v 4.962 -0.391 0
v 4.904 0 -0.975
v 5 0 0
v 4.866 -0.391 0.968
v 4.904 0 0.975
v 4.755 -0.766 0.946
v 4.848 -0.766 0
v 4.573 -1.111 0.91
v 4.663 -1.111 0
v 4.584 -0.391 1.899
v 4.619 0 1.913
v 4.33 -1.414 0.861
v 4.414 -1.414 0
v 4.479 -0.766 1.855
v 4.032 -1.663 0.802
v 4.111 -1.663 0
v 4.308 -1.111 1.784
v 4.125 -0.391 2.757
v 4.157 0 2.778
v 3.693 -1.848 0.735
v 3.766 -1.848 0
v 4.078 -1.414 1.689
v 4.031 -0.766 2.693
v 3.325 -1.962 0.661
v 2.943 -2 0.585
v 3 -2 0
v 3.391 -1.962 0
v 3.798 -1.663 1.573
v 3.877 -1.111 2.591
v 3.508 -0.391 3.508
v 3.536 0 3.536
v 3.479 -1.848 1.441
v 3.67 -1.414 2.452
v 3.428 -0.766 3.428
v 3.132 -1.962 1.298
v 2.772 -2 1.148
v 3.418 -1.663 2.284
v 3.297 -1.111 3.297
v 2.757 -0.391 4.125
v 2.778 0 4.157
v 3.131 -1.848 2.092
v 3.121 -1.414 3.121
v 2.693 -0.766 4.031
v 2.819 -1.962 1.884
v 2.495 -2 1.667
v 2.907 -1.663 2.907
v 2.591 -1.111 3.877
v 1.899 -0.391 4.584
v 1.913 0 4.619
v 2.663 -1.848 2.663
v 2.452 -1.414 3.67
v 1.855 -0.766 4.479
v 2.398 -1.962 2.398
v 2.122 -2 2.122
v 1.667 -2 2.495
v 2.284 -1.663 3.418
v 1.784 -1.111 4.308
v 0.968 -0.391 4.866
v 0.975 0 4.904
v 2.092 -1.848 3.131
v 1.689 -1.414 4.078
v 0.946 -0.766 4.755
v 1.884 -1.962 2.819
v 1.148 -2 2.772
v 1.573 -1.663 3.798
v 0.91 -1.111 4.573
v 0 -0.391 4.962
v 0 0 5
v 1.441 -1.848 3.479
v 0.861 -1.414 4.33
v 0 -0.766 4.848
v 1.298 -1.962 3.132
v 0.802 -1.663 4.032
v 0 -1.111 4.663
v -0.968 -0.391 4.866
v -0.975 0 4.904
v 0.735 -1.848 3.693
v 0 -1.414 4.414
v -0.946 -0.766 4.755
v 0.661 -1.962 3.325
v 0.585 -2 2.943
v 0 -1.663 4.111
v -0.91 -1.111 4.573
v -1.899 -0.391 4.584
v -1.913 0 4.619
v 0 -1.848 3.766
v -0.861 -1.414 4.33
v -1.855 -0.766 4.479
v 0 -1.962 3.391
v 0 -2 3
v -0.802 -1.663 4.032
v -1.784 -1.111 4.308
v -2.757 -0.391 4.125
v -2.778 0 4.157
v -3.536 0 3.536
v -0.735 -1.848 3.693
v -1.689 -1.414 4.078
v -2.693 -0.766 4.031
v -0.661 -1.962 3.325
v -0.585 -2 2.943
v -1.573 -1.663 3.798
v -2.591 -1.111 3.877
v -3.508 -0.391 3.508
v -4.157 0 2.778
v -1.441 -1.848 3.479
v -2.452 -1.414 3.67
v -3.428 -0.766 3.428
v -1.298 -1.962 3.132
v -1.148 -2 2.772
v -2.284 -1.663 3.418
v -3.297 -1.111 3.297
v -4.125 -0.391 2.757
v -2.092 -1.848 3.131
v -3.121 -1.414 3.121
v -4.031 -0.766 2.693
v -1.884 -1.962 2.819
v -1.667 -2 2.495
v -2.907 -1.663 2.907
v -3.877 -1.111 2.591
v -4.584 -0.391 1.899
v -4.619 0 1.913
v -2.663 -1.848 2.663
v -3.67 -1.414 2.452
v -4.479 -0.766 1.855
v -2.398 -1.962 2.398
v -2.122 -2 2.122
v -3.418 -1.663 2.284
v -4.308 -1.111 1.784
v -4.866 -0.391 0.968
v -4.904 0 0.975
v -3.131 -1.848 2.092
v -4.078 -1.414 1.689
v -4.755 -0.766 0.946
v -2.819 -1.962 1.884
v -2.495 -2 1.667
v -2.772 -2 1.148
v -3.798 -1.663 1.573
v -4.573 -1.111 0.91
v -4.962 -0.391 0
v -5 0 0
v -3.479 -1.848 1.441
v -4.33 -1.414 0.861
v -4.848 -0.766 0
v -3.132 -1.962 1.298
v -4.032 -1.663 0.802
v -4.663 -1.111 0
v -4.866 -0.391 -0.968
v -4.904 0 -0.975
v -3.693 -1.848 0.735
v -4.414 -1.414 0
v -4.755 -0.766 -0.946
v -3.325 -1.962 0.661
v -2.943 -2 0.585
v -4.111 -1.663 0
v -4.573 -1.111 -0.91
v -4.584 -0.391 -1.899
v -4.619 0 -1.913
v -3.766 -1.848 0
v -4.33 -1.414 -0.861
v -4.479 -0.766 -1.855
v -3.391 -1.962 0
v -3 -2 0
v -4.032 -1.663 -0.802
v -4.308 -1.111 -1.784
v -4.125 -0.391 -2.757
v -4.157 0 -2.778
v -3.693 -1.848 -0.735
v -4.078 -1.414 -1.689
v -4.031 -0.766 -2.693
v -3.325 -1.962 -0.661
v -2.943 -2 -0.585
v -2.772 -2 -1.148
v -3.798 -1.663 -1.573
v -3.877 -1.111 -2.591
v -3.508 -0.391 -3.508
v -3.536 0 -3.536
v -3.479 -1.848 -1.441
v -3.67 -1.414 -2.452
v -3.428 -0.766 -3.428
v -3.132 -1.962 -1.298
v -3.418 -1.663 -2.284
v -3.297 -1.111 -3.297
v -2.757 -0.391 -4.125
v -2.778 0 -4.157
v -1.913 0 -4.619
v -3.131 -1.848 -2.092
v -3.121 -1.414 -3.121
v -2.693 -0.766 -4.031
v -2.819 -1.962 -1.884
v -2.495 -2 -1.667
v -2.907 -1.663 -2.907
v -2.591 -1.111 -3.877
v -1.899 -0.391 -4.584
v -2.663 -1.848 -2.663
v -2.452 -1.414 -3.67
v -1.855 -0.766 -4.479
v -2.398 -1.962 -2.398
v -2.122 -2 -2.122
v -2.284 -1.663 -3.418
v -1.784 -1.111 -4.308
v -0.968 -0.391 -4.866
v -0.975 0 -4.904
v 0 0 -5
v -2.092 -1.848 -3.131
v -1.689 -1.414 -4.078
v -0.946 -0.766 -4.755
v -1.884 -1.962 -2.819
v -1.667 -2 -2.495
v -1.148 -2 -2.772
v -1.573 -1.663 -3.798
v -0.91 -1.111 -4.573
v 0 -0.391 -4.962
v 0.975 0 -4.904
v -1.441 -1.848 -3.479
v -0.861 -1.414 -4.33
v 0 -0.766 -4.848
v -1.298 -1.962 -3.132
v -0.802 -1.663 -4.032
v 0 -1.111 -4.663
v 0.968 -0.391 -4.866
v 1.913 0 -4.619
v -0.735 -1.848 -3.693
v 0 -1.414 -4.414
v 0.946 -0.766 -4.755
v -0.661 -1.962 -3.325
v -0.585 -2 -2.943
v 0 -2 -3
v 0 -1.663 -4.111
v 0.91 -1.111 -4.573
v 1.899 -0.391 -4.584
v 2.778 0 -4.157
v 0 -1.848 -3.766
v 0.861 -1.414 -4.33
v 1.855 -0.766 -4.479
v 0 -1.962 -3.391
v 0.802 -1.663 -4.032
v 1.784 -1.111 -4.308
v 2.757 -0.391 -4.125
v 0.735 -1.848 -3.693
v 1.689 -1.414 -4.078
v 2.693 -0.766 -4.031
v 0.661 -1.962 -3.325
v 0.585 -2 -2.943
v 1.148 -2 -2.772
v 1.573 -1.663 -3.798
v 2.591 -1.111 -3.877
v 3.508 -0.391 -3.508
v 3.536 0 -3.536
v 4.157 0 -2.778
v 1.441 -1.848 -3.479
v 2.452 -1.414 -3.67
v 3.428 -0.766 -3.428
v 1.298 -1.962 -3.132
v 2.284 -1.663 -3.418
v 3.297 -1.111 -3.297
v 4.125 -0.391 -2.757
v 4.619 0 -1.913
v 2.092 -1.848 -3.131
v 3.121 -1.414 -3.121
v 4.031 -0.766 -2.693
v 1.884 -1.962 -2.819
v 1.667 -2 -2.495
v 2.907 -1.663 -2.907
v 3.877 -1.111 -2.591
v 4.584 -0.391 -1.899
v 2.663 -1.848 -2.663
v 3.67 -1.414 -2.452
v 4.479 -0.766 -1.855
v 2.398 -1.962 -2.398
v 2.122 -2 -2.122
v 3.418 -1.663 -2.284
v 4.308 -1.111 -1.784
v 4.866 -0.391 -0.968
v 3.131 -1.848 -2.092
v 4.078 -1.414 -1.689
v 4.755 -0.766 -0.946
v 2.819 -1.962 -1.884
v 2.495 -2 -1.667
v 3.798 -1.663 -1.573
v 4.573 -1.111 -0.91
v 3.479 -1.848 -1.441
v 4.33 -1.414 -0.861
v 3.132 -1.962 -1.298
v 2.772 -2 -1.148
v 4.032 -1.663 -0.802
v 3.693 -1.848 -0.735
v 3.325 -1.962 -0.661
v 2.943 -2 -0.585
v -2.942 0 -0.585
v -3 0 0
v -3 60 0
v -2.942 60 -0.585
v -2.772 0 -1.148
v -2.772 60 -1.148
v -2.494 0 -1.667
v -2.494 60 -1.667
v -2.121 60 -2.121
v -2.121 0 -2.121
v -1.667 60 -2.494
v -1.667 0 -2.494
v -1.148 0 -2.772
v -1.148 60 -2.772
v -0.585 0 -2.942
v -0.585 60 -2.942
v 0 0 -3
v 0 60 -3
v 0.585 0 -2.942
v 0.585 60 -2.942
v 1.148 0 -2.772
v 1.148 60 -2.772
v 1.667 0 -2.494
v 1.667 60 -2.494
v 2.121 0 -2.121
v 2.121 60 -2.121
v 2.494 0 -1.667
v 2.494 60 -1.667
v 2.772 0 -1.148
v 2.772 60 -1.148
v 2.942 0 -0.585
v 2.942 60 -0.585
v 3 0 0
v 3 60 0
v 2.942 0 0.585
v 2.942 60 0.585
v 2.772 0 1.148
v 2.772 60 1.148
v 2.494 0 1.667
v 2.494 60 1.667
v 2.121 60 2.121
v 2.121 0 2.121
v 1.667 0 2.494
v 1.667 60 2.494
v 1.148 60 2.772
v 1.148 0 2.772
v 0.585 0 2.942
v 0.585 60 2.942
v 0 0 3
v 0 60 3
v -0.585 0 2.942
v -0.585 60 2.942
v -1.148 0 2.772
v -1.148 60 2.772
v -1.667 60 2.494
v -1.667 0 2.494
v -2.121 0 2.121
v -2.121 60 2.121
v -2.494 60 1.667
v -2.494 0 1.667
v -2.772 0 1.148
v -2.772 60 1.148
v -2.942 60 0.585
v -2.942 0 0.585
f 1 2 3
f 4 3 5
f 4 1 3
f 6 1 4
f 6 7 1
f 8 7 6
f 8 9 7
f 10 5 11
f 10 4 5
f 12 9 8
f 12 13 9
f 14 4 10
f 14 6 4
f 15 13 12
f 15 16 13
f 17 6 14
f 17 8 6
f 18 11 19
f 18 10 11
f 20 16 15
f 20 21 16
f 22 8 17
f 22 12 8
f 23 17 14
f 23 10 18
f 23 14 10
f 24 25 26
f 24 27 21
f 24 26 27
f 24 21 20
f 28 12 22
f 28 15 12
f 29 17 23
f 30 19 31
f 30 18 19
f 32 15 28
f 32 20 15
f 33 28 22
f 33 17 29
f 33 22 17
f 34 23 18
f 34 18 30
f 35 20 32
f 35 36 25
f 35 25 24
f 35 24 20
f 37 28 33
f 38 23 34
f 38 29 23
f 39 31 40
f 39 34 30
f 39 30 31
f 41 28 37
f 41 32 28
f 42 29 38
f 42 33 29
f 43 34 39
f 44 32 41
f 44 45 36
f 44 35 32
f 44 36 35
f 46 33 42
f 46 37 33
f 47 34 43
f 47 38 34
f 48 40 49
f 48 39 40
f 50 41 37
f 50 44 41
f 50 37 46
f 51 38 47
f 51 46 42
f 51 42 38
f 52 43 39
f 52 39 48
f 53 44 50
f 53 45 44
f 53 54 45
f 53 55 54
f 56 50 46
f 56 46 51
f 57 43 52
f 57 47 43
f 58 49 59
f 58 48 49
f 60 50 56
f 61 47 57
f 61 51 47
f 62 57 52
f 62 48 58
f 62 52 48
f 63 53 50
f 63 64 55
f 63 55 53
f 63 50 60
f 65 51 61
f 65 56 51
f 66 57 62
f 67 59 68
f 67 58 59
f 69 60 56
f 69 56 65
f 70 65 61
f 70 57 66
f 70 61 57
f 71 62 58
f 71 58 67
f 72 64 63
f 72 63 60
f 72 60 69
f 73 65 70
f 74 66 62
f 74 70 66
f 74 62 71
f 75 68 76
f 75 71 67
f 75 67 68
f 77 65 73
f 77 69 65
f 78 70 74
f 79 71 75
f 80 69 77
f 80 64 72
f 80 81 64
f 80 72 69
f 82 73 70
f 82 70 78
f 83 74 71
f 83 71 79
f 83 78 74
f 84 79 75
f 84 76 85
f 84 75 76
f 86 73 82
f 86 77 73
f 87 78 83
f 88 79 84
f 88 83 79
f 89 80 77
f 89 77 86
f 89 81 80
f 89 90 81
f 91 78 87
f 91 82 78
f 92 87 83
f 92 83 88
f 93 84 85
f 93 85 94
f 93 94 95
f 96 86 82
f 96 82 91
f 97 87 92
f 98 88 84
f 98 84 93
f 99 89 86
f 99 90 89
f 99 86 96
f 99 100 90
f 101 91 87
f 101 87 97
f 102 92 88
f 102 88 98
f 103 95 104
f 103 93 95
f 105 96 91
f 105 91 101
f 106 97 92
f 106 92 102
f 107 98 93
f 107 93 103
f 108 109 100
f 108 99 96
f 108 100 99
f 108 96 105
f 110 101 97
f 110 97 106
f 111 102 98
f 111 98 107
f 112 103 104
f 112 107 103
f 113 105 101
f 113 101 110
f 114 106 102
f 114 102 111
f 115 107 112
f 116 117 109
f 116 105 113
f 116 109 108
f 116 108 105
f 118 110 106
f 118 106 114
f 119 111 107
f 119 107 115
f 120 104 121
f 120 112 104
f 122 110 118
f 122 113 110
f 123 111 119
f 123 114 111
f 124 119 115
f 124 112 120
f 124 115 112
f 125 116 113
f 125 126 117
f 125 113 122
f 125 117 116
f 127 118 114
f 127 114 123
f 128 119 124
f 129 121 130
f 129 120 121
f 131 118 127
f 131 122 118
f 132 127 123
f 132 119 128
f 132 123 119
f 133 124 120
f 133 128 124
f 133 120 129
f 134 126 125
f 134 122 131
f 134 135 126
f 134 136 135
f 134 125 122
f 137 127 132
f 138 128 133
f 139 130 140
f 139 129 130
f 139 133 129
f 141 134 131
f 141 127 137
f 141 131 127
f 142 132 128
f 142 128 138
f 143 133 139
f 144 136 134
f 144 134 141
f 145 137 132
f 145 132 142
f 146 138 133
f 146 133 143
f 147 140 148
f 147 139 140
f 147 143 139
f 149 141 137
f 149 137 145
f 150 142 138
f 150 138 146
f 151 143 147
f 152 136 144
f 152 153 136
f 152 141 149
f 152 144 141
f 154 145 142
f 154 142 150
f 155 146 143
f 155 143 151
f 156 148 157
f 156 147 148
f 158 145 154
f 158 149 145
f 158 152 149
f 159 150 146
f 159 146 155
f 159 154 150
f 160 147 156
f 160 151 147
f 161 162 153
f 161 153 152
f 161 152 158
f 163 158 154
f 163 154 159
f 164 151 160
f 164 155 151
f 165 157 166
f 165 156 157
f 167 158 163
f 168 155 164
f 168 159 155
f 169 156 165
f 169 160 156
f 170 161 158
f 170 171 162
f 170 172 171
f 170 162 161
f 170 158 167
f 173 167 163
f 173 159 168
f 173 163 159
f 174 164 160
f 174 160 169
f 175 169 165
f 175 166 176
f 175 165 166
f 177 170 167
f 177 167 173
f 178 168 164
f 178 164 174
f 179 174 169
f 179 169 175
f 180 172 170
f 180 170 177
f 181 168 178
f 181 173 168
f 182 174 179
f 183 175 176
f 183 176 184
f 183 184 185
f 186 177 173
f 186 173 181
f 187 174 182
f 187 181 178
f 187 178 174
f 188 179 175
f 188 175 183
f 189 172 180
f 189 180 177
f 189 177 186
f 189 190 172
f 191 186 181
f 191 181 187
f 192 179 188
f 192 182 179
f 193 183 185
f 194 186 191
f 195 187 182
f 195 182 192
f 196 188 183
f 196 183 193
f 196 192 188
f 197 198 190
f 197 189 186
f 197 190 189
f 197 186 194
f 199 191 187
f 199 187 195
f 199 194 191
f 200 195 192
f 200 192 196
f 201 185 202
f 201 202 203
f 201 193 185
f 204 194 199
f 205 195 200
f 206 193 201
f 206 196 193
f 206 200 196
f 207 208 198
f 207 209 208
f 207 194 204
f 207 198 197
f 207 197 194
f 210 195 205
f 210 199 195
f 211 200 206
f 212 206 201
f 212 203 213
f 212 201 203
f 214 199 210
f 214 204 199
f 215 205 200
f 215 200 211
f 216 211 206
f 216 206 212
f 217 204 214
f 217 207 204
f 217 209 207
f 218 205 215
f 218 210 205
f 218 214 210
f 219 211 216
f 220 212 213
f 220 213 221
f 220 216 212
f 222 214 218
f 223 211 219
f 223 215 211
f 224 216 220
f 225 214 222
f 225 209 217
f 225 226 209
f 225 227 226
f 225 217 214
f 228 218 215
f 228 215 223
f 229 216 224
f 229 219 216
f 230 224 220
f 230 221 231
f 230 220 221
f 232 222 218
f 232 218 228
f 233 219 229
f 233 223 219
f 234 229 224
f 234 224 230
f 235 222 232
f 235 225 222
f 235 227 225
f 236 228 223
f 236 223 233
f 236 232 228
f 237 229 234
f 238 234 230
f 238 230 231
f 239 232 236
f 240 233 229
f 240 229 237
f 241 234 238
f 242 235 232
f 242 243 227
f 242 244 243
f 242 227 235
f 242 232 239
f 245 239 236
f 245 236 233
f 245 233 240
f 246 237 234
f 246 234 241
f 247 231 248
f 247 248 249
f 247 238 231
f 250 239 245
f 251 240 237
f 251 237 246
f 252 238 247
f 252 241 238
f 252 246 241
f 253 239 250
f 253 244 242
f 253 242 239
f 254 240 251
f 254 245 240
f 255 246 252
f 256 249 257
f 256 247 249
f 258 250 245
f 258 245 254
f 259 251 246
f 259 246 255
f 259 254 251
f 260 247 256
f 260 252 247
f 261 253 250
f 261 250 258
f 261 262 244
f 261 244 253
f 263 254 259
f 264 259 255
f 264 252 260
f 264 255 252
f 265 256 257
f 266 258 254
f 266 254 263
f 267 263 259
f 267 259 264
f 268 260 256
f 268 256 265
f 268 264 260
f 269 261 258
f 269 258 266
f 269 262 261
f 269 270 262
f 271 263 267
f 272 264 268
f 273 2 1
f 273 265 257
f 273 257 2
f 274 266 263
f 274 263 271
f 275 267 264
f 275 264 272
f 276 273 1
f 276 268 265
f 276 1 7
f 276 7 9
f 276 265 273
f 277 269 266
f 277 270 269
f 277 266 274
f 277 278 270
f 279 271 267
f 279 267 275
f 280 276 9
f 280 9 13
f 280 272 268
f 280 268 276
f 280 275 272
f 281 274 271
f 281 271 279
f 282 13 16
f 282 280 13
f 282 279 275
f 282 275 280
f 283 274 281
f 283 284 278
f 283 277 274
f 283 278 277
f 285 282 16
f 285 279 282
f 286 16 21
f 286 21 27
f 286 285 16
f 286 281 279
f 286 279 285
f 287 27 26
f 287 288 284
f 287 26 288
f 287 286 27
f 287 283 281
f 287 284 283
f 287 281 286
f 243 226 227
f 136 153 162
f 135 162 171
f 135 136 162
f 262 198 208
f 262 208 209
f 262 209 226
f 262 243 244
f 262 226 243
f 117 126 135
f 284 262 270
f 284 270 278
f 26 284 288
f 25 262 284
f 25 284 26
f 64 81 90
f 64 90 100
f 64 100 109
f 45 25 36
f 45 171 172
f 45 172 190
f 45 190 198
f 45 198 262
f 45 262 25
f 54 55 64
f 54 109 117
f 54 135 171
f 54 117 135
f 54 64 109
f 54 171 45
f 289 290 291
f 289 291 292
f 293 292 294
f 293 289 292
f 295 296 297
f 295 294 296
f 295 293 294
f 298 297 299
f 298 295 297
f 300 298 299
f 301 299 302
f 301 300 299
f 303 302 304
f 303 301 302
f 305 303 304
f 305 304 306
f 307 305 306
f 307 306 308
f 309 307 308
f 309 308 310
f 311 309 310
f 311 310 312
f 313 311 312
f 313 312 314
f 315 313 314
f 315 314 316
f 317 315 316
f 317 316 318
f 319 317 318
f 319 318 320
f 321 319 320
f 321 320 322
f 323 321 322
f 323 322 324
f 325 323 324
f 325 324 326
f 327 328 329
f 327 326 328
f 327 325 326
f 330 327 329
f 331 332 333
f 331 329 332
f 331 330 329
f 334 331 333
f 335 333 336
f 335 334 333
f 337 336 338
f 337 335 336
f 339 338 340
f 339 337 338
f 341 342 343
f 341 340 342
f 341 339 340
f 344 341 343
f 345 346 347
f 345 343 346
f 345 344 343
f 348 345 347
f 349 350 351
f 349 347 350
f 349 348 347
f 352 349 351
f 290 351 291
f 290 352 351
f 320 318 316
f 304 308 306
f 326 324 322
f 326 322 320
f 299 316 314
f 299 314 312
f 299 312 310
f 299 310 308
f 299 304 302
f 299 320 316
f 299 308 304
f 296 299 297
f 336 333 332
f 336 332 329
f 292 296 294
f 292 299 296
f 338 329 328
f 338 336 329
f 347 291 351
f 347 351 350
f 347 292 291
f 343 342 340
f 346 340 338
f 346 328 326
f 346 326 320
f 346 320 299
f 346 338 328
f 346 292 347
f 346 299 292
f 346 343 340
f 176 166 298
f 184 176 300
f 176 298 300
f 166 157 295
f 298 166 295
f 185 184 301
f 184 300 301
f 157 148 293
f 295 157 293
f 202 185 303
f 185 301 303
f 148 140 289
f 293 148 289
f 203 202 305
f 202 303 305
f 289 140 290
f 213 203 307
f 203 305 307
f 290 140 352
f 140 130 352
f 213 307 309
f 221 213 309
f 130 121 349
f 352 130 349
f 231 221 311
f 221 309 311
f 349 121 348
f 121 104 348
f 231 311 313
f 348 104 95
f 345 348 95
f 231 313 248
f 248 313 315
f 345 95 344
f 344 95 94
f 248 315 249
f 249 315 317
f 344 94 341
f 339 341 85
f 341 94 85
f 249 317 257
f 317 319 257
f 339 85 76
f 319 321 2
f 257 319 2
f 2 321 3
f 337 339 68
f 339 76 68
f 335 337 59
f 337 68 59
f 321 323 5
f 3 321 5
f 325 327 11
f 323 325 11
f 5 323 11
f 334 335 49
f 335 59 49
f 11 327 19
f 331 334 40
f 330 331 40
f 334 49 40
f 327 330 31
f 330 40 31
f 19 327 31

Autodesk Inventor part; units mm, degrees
ref_plane "YZ Plane" through (0, 0, 0) normal (1, 0, 0) x (0, 1, 0)
ref_plane "XZ Plane" through (0, 0, 0) normal (0, 1, 0) x (-1, 0, 0)
ref_plane "XY Plane" through (0, 0, 0) normal (0, 0, 1) x (1, 0, 0)
sketch "Esquisse1" plane through (0, 0, 0) normal (0, 1, 0) x (-1, 0, 0)
  circle A0 centre (0, 0) radius 3
  dimension "d0" = 6
extrude "Extrusion1" add sketch "Esquisse1" along normal blind 60
sketch "Esquisse2" plane through (0, 0, 0) normal (0, -1, 0) x (1, 0, 0)
  circle A0 centre (0, 0) radius 3 projected
  circle A1 centre (0, 0) radius 5
  dimension "d3" = 10
extrude "Extrusion2" add sketch "Esquisse2" along normal blind 2 contours A0 | A1
fillet "Congé1" radius 2 1 edges at (-5, -2, 0)
properties part number "vis_6mm_100mm"
